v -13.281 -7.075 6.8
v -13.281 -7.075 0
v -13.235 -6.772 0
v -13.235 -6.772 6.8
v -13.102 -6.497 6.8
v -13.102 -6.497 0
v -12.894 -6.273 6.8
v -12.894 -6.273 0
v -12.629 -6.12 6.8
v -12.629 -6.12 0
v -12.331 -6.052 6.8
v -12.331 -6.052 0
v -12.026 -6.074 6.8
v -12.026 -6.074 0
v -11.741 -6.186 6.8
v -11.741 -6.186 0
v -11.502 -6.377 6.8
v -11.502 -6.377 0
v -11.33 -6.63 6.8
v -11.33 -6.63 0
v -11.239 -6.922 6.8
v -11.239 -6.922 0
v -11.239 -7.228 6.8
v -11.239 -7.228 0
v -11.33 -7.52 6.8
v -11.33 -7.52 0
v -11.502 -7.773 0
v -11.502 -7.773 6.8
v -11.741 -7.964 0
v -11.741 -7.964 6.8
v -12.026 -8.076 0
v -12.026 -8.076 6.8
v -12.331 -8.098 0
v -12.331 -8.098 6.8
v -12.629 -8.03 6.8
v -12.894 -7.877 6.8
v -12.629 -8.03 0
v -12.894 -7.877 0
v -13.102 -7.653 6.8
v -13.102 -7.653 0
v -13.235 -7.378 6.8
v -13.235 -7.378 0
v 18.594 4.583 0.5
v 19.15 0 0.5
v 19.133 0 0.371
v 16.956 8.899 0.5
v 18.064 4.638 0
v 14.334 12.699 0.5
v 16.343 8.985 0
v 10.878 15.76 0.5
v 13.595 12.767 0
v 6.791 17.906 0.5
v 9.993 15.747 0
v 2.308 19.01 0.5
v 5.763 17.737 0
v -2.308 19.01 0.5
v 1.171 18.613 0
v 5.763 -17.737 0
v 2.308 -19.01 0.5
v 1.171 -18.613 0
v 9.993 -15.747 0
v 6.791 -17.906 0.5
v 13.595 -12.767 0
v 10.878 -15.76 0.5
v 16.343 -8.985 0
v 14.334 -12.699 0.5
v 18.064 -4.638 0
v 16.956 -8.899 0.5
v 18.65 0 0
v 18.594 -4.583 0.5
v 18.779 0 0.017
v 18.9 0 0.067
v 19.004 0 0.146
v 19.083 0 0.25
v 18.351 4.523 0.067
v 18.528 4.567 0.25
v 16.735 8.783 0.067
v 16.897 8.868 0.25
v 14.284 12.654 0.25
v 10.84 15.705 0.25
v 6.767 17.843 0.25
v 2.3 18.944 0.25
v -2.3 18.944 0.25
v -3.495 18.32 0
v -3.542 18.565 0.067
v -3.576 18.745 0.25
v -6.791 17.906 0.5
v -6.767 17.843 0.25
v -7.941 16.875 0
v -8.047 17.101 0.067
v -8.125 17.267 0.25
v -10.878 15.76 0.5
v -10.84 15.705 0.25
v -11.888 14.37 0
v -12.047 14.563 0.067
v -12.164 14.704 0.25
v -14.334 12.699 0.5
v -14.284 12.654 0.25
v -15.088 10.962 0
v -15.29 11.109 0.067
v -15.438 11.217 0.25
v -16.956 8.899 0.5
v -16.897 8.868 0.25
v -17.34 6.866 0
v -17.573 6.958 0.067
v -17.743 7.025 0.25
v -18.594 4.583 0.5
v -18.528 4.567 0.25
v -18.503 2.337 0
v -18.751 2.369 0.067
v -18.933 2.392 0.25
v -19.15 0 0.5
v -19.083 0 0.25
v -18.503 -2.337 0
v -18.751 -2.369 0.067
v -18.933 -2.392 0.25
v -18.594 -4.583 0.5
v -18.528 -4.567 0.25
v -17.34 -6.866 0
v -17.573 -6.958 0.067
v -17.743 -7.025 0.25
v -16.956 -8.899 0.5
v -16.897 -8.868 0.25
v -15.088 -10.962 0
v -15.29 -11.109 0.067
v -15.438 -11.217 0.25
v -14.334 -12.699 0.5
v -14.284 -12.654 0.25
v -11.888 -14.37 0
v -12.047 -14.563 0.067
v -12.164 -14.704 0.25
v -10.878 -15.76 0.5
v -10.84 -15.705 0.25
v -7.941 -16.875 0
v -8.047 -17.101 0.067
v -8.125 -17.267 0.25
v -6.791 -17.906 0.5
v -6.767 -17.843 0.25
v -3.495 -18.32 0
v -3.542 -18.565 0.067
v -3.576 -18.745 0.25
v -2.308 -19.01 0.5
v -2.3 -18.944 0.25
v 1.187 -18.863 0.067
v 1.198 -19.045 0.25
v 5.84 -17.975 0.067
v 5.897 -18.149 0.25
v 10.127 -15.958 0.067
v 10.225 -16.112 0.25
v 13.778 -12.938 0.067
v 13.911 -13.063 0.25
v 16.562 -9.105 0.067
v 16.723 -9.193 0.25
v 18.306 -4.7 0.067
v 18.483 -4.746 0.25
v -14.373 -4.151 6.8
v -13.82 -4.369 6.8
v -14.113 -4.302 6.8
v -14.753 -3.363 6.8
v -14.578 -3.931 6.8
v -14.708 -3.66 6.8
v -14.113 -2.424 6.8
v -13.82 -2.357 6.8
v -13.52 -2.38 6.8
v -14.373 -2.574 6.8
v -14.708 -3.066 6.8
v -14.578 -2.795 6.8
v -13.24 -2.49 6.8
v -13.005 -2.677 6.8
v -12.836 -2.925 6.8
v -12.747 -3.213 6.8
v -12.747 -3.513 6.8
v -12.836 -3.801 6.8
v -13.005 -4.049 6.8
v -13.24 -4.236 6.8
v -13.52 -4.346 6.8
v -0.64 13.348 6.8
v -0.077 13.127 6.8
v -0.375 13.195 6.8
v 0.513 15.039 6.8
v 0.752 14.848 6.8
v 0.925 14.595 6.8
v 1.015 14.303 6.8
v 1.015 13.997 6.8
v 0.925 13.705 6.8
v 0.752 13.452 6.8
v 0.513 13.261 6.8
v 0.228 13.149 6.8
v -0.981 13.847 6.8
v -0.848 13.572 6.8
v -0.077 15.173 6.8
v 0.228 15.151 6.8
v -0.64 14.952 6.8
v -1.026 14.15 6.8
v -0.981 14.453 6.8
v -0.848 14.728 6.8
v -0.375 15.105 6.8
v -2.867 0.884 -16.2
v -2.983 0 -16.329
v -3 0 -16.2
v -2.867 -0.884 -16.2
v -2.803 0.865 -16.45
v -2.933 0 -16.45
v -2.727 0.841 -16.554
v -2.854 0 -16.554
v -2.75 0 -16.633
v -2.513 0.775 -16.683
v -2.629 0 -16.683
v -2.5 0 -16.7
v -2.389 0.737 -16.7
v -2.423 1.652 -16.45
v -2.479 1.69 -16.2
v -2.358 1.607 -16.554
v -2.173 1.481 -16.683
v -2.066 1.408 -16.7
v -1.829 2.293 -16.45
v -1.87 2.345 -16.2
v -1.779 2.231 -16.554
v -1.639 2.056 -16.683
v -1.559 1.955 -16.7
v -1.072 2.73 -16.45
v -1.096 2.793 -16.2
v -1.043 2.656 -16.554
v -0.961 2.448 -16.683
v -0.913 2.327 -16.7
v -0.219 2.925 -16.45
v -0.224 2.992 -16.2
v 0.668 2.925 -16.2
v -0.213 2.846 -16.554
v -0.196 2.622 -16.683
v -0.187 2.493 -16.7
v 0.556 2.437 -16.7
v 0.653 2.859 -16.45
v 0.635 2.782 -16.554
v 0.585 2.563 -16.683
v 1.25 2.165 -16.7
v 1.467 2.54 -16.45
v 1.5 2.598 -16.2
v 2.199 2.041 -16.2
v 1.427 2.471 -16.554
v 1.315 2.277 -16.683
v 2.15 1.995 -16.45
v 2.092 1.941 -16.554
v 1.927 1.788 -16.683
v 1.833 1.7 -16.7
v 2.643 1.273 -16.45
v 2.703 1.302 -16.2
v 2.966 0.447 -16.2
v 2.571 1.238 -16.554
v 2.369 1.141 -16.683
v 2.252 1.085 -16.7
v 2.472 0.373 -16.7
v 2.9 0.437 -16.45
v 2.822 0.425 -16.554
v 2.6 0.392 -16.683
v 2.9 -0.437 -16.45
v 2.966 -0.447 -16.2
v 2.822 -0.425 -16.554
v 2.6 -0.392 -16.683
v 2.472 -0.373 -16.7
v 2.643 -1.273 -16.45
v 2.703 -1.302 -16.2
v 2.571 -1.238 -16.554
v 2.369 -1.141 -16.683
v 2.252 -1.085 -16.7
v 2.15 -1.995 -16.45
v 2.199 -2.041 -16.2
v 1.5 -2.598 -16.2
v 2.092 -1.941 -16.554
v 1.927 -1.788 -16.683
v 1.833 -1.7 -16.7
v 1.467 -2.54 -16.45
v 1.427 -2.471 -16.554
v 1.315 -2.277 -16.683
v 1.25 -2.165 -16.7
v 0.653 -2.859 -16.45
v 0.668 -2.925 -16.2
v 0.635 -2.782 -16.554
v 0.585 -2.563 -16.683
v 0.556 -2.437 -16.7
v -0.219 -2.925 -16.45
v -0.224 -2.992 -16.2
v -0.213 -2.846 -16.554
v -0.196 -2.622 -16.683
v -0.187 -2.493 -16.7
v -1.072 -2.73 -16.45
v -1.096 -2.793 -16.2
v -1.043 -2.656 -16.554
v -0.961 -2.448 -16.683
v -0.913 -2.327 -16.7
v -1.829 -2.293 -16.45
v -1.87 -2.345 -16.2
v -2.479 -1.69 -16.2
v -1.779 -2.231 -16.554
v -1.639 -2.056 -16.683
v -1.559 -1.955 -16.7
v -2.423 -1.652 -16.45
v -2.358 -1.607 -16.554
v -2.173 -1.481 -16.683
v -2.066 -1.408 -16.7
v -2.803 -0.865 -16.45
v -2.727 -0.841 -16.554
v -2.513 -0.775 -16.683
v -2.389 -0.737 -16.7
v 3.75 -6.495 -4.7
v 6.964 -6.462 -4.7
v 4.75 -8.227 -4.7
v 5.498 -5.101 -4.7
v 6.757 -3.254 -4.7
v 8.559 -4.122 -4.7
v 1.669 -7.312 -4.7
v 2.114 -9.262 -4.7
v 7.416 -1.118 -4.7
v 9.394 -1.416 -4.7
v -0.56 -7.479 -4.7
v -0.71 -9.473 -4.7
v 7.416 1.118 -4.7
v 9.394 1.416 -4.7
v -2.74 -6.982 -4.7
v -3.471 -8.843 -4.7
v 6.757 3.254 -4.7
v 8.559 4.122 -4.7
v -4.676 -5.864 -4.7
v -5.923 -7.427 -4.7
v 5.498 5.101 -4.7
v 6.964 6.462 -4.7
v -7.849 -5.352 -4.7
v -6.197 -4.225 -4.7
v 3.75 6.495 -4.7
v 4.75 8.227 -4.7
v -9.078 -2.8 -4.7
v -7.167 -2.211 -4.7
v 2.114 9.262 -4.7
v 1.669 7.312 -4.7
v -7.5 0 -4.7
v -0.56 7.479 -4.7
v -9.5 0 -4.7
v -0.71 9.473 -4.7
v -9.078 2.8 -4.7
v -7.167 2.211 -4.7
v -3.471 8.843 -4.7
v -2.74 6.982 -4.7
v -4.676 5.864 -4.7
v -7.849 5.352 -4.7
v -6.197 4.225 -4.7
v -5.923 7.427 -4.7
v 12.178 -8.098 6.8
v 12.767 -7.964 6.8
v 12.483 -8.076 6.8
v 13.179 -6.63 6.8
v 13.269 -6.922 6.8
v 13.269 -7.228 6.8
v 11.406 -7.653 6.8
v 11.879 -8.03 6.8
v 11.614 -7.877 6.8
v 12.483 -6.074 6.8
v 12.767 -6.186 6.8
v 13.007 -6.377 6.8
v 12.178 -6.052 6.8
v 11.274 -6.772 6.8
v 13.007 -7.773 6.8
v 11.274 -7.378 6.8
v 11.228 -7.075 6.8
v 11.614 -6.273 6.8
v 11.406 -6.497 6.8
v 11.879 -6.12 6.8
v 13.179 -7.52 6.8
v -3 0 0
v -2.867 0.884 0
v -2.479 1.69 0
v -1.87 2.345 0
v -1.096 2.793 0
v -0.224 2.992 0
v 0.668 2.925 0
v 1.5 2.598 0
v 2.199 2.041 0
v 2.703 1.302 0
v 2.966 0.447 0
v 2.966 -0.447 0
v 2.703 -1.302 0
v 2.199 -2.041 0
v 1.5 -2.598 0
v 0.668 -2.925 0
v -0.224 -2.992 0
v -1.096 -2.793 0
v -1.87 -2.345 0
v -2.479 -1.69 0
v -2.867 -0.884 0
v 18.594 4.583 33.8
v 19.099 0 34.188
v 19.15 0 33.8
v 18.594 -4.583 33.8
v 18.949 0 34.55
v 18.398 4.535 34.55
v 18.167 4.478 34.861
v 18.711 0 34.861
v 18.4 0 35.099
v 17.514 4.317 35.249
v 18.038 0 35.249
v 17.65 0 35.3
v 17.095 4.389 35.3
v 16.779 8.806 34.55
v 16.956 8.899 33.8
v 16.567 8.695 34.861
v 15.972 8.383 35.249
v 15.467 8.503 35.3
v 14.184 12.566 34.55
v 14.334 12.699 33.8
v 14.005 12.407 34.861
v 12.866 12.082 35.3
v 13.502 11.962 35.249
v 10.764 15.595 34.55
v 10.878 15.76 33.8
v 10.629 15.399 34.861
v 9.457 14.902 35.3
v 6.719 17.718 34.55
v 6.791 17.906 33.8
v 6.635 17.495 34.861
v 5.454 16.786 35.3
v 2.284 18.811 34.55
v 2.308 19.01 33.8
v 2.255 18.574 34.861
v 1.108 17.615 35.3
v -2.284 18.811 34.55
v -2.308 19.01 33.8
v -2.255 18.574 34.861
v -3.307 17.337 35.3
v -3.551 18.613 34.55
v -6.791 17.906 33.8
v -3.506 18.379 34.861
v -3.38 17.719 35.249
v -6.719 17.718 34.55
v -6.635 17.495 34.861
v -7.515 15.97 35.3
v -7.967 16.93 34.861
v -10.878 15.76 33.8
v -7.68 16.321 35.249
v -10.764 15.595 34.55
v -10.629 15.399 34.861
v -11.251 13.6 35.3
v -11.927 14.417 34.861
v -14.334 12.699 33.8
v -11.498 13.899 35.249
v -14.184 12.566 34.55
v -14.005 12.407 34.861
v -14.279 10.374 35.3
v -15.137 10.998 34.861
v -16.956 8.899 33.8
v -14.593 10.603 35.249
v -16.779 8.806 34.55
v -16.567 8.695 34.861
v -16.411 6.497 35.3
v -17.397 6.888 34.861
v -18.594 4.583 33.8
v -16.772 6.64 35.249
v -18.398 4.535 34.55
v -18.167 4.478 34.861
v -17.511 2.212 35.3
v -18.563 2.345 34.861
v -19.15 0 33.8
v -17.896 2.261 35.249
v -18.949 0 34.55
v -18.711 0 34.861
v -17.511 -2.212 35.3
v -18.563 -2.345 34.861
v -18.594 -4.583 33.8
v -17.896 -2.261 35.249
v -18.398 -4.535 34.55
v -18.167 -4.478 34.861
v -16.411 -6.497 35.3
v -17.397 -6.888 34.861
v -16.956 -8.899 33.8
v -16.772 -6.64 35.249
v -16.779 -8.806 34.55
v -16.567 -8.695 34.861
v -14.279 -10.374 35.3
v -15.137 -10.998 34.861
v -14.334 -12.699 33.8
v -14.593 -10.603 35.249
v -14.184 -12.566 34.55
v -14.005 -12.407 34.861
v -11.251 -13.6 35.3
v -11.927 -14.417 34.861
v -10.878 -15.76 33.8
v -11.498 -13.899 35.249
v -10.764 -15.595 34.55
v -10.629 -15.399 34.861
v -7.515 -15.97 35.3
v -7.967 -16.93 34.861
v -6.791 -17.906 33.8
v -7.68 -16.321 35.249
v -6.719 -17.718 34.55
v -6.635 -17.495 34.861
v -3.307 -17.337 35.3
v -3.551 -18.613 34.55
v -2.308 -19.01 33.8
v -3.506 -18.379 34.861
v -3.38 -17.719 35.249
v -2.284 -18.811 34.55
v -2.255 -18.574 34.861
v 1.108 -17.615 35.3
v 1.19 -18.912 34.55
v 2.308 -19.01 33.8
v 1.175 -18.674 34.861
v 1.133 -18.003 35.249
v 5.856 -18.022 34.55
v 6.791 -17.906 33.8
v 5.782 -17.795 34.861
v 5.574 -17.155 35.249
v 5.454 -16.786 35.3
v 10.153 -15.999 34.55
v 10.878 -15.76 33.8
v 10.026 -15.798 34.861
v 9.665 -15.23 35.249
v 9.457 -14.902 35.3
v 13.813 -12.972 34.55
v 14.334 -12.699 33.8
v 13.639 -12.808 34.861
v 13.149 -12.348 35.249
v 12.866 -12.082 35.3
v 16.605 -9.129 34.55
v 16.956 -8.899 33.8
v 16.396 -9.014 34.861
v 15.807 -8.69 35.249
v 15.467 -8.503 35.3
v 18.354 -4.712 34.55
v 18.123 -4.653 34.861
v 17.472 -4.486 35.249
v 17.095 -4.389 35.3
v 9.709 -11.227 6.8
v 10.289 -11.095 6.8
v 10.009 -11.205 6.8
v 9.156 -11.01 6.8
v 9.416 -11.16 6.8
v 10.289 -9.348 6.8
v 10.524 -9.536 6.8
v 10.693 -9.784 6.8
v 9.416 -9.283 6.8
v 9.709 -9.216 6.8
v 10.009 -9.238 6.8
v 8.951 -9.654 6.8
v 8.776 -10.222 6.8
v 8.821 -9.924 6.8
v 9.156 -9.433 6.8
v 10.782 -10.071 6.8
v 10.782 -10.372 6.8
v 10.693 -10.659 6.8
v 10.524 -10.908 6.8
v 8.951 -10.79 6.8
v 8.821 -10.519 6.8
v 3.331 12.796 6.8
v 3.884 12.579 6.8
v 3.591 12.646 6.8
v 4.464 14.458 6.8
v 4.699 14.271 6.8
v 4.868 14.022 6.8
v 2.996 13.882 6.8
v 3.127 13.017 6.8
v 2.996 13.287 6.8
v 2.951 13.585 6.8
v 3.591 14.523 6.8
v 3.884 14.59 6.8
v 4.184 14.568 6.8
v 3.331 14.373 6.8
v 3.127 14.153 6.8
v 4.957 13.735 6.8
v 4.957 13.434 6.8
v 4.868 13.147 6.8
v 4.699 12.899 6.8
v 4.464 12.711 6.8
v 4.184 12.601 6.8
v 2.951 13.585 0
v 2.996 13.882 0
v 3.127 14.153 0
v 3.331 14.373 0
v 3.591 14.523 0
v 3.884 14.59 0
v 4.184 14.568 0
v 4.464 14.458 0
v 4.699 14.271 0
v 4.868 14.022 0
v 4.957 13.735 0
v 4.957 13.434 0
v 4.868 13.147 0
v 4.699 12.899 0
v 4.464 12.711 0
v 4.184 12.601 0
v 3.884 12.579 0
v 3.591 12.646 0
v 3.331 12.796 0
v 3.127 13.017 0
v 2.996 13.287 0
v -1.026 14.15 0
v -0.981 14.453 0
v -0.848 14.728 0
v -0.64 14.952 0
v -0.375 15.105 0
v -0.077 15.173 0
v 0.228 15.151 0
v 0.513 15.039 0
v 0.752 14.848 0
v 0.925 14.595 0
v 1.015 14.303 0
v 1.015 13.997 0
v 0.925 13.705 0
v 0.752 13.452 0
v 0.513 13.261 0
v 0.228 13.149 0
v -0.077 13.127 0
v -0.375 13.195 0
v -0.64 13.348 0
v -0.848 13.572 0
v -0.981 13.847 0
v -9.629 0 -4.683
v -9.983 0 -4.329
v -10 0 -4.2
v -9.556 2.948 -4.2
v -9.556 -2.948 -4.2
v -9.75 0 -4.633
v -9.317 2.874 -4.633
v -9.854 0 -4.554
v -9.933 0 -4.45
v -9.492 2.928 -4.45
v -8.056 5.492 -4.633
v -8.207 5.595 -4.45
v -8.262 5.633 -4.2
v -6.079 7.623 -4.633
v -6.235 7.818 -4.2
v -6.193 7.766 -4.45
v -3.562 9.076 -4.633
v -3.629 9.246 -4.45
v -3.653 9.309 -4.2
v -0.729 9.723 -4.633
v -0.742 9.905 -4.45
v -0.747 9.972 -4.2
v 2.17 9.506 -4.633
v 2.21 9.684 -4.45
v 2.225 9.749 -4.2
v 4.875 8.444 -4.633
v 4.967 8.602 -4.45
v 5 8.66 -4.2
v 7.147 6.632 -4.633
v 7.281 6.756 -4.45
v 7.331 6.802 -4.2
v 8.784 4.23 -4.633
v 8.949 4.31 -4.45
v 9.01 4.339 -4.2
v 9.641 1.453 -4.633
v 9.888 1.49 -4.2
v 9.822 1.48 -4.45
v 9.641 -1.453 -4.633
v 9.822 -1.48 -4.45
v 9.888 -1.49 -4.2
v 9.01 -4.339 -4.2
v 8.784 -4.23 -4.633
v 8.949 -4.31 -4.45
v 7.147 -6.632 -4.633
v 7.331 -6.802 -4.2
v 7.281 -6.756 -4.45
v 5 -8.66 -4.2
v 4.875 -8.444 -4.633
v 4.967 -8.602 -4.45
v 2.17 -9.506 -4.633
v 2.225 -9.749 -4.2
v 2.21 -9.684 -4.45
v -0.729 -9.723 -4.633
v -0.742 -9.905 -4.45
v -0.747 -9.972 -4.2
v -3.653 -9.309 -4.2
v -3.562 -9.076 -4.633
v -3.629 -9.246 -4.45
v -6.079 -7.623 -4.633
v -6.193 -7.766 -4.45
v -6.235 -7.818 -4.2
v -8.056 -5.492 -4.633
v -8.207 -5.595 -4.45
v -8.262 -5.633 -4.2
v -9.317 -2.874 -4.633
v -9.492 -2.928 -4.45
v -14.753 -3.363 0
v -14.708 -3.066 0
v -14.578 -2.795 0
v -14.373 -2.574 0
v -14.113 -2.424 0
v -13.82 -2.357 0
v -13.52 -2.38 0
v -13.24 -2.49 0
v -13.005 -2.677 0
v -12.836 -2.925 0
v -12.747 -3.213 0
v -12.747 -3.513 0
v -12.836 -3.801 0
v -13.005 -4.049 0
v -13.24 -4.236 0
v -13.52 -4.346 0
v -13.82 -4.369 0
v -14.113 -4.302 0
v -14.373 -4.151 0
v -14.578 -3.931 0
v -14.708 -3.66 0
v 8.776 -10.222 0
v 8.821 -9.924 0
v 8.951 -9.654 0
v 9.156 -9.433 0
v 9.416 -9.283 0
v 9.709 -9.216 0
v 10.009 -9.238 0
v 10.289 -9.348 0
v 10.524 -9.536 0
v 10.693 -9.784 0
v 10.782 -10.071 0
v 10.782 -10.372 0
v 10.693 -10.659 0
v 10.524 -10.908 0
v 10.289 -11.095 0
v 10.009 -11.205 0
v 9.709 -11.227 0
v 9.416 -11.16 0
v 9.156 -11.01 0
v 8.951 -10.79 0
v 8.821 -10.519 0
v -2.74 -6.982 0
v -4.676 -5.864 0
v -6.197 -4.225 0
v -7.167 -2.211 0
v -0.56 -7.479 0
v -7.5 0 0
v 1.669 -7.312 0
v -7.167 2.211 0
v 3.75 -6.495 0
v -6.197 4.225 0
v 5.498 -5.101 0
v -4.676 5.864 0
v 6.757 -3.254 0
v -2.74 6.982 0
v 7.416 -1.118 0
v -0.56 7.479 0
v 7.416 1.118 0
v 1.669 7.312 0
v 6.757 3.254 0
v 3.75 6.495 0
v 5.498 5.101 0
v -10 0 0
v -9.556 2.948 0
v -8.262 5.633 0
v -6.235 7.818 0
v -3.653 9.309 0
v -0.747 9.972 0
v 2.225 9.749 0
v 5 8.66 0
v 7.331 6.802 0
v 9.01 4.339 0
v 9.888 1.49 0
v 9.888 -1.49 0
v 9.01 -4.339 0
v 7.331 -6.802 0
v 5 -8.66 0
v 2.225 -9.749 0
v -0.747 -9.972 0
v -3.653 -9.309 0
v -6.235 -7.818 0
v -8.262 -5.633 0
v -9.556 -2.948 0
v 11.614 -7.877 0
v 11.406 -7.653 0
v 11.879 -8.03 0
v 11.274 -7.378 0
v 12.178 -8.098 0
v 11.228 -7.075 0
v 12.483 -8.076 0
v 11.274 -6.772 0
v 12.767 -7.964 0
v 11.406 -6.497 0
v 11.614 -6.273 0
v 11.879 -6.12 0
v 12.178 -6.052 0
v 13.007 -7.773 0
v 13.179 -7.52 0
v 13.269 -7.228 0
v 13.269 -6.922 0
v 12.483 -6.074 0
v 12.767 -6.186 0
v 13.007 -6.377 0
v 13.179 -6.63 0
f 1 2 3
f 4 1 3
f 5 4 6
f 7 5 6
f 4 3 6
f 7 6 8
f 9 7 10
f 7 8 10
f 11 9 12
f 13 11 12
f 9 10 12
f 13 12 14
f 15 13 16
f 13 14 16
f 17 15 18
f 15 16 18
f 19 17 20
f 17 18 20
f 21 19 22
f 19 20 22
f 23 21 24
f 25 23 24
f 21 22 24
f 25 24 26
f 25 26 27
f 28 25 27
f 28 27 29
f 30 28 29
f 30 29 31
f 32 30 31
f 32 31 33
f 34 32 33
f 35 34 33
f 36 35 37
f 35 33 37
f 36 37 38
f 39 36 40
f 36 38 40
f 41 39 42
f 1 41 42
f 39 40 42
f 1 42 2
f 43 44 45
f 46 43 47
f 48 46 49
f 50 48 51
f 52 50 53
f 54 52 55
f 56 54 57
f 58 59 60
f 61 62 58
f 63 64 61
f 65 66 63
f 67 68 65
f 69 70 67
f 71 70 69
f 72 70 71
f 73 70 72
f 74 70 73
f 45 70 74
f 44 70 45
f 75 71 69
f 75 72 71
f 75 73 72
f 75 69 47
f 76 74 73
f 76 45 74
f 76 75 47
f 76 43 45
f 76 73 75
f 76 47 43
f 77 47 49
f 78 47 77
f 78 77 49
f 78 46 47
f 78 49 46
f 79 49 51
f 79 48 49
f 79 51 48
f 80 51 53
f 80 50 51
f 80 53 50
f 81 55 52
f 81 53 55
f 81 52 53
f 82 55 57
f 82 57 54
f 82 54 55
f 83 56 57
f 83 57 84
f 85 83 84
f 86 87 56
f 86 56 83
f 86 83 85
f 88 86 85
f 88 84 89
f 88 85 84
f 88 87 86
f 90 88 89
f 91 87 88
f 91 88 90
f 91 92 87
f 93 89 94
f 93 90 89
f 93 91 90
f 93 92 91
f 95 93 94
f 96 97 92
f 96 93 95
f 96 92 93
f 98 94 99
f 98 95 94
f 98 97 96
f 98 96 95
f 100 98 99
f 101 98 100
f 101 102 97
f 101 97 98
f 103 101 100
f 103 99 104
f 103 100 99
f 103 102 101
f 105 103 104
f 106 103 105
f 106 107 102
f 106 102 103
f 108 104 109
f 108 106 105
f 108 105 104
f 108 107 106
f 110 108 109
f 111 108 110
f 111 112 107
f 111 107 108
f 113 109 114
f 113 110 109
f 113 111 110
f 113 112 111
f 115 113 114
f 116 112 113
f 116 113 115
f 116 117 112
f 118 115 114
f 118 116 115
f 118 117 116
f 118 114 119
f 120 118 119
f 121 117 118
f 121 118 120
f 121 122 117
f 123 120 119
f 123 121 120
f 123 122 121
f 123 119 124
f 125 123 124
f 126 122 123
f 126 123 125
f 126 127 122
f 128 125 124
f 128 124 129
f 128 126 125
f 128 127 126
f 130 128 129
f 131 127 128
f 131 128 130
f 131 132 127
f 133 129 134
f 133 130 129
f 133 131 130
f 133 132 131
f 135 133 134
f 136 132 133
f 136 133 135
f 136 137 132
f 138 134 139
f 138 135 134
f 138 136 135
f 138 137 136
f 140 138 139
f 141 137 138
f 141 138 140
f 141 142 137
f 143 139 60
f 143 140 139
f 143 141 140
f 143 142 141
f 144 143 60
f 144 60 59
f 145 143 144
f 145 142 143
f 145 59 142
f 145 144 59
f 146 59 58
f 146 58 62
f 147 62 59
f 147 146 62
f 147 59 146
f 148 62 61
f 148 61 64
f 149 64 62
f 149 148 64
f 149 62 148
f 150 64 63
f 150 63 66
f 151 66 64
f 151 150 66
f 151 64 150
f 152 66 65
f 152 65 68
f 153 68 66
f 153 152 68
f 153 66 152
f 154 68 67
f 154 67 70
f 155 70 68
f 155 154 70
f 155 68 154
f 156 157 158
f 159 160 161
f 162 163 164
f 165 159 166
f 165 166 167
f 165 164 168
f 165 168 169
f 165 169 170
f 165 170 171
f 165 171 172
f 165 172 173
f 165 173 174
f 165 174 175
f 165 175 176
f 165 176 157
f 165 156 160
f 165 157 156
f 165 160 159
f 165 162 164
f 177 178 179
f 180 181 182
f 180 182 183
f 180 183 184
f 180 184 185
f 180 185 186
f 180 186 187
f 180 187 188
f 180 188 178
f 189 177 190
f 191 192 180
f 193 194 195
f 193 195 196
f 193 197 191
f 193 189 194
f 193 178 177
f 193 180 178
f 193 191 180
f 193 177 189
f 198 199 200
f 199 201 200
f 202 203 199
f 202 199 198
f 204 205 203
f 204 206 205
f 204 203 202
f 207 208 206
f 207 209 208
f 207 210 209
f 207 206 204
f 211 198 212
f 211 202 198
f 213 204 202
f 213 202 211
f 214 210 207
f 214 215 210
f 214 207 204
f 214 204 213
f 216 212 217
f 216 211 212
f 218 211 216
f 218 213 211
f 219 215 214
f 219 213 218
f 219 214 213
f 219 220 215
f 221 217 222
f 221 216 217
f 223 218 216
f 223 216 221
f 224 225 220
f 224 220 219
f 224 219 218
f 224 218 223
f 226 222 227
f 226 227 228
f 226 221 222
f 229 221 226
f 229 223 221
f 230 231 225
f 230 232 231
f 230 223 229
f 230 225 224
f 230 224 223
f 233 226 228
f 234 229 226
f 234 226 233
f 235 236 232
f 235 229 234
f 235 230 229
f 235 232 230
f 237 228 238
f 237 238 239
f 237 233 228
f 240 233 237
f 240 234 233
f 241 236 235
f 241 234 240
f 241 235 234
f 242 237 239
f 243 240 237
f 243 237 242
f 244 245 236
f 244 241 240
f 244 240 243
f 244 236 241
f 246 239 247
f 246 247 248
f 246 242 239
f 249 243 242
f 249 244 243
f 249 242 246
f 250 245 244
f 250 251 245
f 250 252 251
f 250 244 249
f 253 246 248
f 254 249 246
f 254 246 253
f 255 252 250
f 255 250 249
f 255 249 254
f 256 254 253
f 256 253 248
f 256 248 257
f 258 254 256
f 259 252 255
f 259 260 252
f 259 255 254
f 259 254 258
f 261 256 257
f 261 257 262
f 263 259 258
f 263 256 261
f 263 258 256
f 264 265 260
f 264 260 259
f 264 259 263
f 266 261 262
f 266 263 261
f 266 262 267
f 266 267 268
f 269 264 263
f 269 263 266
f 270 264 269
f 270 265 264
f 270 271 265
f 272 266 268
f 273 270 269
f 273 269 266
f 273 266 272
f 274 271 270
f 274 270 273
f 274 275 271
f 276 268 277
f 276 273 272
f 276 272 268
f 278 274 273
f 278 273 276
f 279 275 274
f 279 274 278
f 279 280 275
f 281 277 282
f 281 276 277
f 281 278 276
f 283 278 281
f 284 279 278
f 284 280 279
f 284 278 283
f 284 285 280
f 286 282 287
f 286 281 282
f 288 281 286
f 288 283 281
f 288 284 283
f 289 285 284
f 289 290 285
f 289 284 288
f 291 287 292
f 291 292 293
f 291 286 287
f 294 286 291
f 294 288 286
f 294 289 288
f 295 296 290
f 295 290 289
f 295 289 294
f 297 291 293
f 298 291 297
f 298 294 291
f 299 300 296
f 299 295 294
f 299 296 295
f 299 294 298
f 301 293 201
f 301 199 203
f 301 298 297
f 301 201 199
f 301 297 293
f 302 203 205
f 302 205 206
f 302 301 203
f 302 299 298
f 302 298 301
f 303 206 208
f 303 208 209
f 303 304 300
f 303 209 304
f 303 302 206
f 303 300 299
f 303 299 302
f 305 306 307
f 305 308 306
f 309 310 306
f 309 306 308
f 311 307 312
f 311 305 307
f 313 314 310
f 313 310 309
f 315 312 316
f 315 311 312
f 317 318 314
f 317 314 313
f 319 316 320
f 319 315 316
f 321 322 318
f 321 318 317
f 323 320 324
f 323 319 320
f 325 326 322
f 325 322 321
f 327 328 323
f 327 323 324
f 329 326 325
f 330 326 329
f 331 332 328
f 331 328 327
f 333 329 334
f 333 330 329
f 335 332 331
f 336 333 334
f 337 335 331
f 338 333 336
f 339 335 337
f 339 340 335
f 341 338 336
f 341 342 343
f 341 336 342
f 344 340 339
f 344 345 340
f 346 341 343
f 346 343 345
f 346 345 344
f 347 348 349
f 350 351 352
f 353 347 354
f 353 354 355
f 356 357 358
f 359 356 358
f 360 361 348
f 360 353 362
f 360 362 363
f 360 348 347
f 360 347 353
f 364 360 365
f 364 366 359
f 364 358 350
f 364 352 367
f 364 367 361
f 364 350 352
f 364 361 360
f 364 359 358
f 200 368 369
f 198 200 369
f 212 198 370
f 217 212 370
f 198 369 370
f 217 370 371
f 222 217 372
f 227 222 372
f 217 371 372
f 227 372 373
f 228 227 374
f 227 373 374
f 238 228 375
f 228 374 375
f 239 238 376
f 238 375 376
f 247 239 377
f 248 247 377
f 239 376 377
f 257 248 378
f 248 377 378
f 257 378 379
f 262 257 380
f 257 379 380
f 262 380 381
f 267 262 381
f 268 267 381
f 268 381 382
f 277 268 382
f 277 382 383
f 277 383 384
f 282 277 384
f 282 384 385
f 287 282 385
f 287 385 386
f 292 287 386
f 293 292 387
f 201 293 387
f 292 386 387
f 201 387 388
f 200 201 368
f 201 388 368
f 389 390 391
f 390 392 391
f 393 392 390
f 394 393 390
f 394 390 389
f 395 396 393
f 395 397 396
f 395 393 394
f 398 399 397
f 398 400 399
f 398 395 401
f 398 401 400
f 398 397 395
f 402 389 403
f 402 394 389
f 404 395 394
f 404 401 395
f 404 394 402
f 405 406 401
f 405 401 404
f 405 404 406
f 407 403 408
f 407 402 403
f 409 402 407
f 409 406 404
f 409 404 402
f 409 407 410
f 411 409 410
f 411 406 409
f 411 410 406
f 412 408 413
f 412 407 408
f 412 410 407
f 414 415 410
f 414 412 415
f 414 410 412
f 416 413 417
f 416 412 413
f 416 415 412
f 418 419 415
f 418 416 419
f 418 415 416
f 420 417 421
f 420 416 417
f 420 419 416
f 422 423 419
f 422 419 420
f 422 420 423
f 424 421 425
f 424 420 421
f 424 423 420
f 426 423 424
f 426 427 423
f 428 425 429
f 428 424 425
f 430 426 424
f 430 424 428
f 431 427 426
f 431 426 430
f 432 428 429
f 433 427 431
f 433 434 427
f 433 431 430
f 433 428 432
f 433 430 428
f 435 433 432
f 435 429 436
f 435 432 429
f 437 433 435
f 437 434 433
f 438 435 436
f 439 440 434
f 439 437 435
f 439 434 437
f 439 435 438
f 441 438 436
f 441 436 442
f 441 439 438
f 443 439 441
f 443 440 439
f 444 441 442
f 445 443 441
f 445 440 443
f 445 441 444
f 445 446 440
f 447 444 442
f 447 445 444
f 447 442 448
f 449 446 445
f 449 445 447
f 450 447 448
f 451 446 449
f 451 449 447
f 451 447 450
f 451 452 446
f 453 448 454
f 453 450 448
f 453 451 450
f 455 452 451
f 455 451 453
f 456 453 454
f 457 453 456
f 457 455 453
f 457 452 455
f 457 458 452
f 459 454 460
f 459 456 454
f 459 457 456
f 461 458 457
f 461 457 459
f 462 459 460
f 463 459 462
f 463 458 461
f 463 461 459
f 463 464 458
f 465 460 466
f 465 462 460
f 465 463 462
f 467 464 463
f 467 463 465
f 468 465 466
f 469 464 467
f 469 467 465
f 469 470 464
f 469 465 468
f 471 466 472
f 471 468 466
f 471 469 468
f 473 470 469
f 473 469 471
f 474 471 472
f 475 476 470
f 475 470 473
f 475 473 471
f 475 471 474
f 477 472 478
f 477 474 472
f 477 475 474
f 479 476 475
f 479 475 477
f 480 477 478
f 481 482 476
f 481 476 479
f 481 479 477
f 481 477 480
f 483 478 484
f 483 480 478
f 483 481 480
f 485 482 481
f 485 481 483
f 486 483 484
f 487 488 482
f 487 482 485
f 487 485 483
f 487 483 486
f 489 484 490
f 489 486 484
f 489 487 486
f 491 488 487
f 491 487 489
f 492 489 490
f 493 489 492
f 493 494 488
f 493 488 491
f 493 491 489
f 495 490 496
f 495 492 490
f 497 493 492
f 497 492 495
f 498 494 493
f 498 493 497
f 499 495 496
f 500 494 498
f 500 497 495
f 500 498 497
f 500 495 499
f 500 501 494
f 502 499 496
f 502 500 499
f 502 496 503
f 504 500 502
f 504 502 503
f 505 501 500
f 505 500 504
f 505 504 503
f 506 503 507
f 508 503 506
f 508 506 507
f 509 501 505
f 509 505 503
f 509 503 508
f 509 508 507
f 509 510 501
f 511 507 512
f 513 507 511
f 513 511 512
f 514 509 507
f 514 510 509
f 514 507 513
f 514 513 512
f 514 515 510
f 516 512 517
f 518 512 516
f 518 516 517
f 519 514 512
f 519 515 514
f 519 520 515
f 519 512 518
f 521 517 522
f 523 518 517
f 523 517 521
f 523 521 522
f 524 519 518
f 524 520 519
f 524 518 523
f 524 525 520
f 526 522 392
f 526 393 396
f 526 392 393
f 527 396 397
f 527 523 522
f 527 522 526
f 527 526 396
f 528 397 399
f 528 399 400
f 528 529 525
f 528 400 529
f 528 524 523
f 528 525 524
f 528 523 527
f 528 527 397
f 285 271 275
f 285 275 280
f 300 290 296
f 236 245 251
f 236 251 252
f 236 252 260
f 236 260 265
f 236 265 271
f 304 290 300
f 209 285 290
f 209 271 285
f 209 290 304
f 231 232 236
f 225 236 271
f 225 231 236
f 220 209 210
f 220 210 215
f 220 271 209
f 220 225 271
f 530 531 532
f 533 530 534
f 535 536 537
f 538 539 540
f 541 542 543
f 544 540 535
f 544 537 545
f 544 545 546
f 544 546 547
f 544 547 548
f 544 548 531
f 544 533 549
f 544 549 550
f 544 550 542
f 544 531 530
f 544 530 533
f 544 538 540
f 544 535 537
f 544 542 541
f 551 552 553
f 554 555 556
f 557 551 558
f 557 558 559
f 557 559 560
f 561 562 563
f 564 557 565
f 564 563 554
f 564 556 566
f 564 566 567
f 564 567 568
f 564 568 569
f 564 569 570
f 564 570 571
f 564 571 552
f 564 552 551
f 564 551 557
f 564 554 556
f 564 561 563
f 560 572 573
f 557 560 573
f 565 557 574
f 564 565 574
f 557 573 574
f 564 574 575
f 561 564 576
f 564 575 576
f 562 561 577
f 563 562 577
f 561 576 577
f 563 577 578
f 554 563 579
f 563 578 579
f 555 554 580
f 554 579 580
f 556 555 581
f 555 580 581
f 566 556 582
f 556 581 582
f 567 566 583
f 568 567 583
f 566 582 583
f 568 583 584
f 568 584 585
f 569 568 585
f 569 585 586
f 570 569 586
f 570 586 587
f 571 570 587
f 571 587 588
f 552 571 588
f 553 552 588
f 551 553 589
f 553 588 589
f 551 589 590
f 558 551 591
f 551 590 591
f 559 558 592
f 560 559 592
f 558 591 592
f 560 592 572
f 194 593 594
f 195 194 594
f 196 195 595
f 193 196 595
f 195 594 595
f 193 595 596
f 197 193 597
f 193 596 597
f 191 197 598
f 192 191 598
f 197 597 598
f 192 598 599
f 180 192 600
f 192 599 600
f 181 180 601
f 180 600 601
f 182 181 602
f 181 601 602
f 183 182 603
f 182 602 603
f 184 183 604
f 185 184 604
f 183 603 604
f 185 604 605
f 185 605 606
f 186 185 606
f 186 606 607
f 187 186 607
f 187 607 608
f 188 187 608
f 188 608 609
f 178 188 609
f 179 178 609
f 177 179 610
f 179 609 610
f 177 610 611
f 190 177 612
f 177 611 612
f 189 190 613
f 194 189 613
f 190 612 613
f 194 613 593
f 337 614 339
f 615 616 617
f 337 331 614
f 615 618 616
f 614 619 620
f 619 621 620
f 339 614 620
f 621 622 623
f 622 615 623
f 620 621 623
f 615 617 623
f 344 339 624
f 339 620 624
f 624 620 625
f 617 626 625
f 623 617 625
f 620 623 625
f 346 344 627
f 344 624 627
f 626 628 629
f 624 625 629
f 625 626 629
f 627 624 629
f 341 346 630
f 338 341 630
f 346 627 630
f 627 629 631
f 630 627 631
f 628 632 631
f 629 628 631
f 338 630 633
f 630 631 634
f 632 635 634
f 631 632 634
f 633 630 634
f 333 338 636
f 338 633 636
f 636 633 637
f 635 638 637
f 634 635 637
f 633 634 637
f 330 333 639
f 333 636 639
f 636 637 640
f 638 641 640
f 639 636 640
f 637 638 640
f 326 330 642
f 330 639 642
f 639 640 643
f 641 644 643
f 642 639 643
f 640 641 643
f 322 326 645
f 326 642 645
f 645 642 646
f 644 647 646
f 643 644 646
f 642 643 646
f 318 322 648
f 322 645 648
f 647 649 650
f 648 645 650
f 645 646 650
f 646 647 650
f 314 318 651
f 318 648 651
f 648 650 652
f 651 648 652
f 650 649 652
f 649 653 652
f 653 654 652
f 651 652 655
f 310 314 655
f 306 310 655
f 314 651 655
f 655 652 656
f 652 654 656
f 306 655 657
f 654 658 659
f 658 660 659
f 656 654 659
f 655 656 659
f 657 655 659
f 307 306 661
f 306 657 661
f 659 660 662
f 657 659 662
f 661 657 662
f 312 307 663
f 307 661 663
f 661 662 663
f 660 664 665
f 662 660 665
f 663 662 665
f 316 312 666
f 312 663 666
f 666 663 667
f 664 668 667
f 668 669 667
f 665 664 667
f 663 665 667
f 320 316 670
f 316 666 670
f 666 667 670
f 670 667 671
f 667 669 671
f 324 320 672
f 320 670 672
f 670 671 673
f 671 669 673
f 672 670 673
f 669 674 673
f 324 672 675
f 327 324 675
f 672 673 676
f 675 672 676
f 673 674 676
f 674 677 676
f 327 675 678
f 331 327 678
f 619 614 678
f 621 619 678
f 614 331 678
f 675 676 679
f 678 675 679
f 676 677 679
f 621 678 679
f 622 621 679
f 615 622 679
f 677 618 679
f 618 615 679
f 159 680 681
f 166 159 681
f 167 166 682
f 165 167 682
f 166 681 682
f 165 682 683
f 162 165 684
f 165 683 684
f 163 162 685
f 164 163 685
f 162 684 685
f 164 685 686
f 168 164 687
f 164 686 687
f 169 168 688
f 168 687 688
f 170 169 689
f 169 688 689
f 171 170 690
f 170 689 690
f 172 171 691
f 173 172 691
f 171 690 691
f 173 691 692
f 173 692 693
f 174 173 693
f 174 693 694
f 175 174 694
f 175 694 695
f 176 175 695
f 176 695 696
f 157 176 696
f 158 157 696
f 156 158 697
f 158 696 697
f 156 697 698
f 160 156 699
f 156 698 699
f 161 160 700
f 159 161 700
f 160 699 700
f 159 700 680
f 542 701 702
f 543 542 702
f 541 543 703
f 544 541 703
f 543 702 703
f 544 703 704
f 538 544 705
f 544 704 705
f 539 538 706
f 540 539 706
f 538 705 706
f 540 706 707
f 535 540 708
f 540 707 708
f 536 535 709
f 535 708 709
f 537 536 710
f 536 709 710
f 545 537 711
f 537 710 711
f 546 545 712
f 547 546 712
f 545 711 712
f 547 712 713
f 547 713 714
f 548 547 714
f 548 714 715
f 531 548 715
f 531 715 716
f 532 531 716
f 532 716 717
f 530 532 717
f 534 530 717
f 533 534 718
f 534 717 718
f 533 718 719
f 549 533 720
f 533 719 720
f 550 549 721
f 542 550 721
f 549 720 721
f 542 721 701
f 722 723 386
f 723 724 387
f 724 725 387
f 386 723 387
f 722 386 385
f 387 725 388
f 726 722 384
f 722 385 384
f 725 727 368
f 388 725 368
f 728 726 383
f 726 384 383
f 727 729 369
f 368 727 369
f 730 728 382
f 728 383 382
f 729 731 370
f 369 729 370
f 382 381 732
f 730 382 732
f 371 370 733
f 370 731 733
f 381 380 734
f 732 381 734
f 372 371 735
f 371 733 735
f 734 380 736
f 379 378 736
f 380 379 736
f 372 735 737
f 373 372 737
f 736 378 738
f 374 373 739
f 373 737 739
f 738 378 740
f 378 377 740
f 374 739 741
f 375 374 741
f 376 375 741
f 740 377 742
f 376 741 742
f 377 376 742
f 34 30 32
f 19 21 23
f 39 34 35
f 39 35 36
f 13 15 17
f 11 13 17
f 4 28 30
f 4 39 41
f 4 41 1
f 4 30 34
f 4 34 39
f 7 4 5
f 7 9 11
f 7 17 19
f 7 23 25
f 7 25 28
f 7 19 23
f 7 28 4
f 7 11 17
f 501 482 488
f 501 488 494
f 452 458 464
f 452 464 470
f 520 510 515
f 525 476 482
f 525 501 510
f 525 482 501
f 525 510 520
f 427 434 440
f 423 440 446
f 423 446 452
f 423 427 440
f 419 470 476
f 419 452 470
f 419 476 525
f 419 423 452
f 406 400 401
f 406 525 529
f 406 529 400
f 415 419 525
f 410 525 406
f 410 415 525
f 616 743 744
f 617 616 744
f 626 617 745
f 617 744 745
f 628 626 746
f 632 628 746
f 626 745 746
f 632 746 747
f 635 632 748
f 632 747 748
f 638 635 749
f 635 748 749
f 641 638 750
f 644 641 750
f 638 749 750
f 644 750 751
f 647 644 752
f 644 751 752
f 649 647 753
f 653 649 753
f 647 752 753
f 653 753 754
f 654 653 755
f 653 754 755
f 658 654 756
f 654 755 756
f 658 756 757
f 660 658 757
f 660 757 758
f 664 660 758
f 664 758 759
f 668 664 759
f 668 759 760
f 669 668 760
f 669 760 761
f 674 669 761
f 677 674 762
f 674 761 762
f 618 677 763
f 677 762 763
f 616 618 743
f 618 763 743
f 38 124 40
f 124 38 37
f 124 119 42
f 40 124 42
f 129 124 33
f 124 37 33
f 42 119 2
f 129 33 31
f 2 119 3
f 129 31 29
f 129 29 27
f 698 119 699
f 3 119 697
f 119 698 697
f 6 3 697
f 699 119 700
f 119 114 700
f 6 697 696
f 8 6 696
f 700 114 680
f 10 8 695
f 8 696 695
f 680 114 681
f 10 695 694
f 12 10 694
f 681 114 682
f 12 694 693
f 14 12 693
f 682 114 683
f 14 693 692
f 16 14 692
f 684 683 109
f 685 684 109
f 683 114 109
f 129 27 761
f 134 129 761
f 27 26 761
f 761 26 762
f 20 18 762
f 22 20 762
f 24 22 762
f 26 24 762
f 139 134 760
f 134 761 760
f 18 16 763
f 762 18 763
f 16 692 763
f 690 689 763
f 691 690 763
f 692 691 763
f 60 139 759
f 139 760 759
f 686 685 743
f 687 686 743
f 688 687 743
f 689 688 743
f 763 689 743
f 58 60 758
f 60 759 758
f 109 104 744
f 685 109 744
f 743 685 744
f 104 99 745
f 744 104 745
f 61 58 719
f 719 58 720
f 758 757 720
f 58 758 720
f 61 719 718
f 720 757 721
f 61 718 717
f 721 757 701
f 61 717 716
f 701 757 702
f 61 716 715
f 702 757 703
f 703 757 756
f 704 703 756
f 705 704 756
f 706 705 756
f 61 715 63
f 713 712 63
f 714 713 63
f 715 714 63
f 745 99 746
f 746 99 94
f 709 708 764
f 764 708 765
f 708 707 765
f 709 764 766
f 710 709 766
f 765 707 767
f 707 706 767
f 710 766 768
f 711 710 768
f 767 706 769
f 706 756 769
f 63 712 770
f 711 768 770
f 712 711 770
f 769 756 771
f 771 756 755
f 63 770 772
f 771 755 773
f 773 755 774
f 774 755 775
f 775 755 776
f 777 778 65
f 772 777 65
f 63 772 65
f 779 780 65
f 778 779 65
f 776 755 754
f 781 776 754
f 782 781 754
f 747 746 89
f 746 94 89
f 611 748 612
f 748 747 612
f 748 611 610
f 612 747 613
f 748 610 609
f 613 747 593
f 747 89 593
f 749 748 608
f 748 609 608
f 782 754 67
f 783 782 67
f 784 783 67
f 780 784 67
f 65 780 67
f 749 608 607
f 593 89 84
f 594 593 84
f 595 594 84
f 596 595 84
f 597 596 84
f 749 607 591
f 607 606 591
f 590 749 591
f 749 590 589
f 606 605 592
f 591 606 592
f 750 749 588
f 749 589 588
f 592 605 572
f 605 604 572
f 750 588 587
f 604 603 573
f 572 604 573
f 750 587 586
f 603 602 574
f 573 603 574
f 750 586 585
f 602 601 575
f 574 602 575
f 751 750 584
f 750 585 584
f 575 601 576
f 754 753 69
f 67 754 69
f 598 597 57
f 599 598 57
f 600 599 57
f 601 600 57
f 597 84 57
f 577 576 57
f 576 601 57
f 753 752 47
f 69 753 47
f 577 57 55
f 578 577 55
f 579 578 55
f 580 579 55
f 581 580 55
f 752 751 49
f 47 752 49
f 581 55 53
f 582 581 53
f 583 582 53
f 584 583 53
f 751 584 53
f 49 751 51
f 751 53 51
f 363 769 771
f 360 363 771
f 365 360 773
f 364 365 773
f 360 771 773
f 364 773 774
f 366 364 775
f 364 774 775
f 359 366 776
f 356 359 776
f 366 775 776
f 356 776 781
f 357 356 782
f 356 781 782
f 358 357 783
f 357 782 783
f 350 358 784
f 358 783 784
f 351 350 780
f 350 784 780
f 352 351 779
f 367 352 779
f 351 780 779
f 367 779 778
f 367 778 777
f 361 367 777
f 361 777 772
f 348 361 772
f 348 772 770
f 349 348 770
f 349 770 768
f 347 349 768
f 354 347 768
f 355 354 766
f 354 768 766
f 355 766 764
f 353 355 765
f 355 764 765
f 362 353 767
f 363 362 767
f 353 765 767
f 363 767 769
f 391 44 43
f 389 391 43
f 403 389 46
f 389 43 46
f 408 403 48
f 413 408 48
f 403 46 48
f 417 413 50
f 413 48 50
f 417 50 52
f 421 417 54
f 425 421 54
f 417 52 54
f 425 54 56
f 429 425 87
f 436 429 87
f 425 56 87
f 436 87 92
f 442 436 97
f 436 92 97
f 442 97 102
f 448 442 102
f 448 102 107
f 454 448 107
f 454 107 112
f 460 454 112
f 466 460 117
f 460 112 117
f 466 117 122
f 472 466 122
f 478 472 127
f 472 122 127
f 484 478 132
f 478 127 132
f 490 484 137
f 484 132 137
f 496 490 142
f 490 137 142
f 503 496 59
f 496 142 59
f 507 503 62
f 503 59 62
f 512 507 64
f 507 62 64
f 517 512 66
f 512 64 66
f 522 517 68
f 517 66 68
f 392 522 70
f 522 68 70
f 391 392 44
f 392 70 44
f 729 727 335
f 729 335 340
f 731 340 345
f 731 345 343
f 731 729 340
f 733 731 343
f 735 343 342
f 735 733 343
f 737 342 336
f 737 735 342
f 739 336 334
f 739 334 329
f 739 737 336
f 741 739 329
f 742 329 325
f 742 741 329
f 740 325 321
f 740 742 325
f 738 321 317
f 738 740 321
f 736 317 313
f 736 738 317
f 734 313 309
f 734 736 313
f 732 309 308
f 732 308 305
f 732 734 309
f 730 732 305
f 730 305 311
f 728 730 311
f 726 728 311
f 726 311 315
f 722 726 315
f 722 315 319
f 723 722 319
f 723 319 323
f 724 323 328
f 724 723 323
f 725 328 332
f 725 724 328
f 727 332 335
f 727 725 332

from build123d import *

# Parameters (mm, degrees)
SKETCH1_R           = 19.15
BOSS_EXTRUDE1_DEPTH = 35.3
SKETCH2_R           = 10
SKETCH2_R_2         = 7.5
BOSS_EXTRUDE2_DEPTH = 4.7
SKETCH3_R           = 3
BOSS_EXTRUDE3_DEPTH = 16.7
SKETCH4_R           = 1.008522138
SKETCH4_R_2         = 1.026344308
CUT_EXTRUDE1_DEPTH  = 6.8
FILLET1_R           = 1.5
FILLET2_R           = 0.5
FILLET3_R           = 0.5
FILLET4_R           = 0.5


with BuildPart() as part:
    # Sketch1 → Boss-Extrude1 (new body)
    with BuildSketch(Plane.XY):
        Circle(SKETCH1_R)
    extrude(amount=BOSS_EXTRUDE1_DEPTH)

    # Sketch2 → Boss-Extrude2 (add)
    with BuildSketch(Plane(origin=(0, 0, 0), x_dir=(-1, 0, 0), z_dir=(0, 0, -1))):
        Circle(SKETCH2_R)
        Circle(SKETCH2_R_2, mode=Mode.SUBTRACT)
    extrude(amount=BOSS_EXTRUDE2_DEPTH)

    # Sketch3 → Boss-Extrude3 (add)
    with BuildSketch(Plane(origin=(0, 0, 0), x_dir=(-1, 0, 0), z_dir=(0, 0, -1))):
        Circle(SKETCH3_R)
    extrude(amount=BOSS_EXTRUDE3_DEPTH)

    # Sketch4 → Cut-Extrude1 (cut)
    with BuildSketch(Plane(origin=(0, 0, 0), x_dir=(-1, 0, 0), z_dir=(0, 0, -1))):
        with Locations((-3.959842876, 13.584628975)):
            Circle(SKETCH4_R)
        with Locations((0, 14.15)):
            Circle(SKETCH4_R_2)
        with Locations((12.254259464, -7.075)):
            Circle(SKETCH4_R_2)
        with Locations((13.744555232, -3.362989962)):
            Circle(SKETCH4_R)
        with Locations((-12.254259464, -7.075)):
            Circle(SKETCH4_R_2)
        with Locations((-9.784712355, -10.221639013)):
            Circle(SKETCH4_R)
    extrude(amount=-CUT_EXTRUDE1_DEPTH, mode=Mode.SUBTRACT)

    # Fillet1
    fillet1_edges = [part.edges().sort_by_distance(p)[0] for p in [
        (-19.15, 0, 35.3),
    ]]
    fillet(fillet1_edges, radius=FILLET1_R)

    # Fillet2
    fillet2_edges = [part.edges().sort_by_distance(p)[0] for p in [
        (3, 0, -16.7),
    ]]
    fillet(fillet2_edges, radius=FILLET2_R)

    # Fillet3
    fillet3_edges = [part.edges().sort_by_distance(p)[0] for p in [
        (10, 0, -4.7),
    ]]
    fillet(fillet3_edges, radius=FILLET3_R)

    # Fillet4
    fillet4_edges = [part.edges().sort_by_distance(p)[0] for p in [
        (-19.15, 0, 0),
    ]]
    fillet(fillet4_edges, radius=FILLET4_R)


solid = part.part
